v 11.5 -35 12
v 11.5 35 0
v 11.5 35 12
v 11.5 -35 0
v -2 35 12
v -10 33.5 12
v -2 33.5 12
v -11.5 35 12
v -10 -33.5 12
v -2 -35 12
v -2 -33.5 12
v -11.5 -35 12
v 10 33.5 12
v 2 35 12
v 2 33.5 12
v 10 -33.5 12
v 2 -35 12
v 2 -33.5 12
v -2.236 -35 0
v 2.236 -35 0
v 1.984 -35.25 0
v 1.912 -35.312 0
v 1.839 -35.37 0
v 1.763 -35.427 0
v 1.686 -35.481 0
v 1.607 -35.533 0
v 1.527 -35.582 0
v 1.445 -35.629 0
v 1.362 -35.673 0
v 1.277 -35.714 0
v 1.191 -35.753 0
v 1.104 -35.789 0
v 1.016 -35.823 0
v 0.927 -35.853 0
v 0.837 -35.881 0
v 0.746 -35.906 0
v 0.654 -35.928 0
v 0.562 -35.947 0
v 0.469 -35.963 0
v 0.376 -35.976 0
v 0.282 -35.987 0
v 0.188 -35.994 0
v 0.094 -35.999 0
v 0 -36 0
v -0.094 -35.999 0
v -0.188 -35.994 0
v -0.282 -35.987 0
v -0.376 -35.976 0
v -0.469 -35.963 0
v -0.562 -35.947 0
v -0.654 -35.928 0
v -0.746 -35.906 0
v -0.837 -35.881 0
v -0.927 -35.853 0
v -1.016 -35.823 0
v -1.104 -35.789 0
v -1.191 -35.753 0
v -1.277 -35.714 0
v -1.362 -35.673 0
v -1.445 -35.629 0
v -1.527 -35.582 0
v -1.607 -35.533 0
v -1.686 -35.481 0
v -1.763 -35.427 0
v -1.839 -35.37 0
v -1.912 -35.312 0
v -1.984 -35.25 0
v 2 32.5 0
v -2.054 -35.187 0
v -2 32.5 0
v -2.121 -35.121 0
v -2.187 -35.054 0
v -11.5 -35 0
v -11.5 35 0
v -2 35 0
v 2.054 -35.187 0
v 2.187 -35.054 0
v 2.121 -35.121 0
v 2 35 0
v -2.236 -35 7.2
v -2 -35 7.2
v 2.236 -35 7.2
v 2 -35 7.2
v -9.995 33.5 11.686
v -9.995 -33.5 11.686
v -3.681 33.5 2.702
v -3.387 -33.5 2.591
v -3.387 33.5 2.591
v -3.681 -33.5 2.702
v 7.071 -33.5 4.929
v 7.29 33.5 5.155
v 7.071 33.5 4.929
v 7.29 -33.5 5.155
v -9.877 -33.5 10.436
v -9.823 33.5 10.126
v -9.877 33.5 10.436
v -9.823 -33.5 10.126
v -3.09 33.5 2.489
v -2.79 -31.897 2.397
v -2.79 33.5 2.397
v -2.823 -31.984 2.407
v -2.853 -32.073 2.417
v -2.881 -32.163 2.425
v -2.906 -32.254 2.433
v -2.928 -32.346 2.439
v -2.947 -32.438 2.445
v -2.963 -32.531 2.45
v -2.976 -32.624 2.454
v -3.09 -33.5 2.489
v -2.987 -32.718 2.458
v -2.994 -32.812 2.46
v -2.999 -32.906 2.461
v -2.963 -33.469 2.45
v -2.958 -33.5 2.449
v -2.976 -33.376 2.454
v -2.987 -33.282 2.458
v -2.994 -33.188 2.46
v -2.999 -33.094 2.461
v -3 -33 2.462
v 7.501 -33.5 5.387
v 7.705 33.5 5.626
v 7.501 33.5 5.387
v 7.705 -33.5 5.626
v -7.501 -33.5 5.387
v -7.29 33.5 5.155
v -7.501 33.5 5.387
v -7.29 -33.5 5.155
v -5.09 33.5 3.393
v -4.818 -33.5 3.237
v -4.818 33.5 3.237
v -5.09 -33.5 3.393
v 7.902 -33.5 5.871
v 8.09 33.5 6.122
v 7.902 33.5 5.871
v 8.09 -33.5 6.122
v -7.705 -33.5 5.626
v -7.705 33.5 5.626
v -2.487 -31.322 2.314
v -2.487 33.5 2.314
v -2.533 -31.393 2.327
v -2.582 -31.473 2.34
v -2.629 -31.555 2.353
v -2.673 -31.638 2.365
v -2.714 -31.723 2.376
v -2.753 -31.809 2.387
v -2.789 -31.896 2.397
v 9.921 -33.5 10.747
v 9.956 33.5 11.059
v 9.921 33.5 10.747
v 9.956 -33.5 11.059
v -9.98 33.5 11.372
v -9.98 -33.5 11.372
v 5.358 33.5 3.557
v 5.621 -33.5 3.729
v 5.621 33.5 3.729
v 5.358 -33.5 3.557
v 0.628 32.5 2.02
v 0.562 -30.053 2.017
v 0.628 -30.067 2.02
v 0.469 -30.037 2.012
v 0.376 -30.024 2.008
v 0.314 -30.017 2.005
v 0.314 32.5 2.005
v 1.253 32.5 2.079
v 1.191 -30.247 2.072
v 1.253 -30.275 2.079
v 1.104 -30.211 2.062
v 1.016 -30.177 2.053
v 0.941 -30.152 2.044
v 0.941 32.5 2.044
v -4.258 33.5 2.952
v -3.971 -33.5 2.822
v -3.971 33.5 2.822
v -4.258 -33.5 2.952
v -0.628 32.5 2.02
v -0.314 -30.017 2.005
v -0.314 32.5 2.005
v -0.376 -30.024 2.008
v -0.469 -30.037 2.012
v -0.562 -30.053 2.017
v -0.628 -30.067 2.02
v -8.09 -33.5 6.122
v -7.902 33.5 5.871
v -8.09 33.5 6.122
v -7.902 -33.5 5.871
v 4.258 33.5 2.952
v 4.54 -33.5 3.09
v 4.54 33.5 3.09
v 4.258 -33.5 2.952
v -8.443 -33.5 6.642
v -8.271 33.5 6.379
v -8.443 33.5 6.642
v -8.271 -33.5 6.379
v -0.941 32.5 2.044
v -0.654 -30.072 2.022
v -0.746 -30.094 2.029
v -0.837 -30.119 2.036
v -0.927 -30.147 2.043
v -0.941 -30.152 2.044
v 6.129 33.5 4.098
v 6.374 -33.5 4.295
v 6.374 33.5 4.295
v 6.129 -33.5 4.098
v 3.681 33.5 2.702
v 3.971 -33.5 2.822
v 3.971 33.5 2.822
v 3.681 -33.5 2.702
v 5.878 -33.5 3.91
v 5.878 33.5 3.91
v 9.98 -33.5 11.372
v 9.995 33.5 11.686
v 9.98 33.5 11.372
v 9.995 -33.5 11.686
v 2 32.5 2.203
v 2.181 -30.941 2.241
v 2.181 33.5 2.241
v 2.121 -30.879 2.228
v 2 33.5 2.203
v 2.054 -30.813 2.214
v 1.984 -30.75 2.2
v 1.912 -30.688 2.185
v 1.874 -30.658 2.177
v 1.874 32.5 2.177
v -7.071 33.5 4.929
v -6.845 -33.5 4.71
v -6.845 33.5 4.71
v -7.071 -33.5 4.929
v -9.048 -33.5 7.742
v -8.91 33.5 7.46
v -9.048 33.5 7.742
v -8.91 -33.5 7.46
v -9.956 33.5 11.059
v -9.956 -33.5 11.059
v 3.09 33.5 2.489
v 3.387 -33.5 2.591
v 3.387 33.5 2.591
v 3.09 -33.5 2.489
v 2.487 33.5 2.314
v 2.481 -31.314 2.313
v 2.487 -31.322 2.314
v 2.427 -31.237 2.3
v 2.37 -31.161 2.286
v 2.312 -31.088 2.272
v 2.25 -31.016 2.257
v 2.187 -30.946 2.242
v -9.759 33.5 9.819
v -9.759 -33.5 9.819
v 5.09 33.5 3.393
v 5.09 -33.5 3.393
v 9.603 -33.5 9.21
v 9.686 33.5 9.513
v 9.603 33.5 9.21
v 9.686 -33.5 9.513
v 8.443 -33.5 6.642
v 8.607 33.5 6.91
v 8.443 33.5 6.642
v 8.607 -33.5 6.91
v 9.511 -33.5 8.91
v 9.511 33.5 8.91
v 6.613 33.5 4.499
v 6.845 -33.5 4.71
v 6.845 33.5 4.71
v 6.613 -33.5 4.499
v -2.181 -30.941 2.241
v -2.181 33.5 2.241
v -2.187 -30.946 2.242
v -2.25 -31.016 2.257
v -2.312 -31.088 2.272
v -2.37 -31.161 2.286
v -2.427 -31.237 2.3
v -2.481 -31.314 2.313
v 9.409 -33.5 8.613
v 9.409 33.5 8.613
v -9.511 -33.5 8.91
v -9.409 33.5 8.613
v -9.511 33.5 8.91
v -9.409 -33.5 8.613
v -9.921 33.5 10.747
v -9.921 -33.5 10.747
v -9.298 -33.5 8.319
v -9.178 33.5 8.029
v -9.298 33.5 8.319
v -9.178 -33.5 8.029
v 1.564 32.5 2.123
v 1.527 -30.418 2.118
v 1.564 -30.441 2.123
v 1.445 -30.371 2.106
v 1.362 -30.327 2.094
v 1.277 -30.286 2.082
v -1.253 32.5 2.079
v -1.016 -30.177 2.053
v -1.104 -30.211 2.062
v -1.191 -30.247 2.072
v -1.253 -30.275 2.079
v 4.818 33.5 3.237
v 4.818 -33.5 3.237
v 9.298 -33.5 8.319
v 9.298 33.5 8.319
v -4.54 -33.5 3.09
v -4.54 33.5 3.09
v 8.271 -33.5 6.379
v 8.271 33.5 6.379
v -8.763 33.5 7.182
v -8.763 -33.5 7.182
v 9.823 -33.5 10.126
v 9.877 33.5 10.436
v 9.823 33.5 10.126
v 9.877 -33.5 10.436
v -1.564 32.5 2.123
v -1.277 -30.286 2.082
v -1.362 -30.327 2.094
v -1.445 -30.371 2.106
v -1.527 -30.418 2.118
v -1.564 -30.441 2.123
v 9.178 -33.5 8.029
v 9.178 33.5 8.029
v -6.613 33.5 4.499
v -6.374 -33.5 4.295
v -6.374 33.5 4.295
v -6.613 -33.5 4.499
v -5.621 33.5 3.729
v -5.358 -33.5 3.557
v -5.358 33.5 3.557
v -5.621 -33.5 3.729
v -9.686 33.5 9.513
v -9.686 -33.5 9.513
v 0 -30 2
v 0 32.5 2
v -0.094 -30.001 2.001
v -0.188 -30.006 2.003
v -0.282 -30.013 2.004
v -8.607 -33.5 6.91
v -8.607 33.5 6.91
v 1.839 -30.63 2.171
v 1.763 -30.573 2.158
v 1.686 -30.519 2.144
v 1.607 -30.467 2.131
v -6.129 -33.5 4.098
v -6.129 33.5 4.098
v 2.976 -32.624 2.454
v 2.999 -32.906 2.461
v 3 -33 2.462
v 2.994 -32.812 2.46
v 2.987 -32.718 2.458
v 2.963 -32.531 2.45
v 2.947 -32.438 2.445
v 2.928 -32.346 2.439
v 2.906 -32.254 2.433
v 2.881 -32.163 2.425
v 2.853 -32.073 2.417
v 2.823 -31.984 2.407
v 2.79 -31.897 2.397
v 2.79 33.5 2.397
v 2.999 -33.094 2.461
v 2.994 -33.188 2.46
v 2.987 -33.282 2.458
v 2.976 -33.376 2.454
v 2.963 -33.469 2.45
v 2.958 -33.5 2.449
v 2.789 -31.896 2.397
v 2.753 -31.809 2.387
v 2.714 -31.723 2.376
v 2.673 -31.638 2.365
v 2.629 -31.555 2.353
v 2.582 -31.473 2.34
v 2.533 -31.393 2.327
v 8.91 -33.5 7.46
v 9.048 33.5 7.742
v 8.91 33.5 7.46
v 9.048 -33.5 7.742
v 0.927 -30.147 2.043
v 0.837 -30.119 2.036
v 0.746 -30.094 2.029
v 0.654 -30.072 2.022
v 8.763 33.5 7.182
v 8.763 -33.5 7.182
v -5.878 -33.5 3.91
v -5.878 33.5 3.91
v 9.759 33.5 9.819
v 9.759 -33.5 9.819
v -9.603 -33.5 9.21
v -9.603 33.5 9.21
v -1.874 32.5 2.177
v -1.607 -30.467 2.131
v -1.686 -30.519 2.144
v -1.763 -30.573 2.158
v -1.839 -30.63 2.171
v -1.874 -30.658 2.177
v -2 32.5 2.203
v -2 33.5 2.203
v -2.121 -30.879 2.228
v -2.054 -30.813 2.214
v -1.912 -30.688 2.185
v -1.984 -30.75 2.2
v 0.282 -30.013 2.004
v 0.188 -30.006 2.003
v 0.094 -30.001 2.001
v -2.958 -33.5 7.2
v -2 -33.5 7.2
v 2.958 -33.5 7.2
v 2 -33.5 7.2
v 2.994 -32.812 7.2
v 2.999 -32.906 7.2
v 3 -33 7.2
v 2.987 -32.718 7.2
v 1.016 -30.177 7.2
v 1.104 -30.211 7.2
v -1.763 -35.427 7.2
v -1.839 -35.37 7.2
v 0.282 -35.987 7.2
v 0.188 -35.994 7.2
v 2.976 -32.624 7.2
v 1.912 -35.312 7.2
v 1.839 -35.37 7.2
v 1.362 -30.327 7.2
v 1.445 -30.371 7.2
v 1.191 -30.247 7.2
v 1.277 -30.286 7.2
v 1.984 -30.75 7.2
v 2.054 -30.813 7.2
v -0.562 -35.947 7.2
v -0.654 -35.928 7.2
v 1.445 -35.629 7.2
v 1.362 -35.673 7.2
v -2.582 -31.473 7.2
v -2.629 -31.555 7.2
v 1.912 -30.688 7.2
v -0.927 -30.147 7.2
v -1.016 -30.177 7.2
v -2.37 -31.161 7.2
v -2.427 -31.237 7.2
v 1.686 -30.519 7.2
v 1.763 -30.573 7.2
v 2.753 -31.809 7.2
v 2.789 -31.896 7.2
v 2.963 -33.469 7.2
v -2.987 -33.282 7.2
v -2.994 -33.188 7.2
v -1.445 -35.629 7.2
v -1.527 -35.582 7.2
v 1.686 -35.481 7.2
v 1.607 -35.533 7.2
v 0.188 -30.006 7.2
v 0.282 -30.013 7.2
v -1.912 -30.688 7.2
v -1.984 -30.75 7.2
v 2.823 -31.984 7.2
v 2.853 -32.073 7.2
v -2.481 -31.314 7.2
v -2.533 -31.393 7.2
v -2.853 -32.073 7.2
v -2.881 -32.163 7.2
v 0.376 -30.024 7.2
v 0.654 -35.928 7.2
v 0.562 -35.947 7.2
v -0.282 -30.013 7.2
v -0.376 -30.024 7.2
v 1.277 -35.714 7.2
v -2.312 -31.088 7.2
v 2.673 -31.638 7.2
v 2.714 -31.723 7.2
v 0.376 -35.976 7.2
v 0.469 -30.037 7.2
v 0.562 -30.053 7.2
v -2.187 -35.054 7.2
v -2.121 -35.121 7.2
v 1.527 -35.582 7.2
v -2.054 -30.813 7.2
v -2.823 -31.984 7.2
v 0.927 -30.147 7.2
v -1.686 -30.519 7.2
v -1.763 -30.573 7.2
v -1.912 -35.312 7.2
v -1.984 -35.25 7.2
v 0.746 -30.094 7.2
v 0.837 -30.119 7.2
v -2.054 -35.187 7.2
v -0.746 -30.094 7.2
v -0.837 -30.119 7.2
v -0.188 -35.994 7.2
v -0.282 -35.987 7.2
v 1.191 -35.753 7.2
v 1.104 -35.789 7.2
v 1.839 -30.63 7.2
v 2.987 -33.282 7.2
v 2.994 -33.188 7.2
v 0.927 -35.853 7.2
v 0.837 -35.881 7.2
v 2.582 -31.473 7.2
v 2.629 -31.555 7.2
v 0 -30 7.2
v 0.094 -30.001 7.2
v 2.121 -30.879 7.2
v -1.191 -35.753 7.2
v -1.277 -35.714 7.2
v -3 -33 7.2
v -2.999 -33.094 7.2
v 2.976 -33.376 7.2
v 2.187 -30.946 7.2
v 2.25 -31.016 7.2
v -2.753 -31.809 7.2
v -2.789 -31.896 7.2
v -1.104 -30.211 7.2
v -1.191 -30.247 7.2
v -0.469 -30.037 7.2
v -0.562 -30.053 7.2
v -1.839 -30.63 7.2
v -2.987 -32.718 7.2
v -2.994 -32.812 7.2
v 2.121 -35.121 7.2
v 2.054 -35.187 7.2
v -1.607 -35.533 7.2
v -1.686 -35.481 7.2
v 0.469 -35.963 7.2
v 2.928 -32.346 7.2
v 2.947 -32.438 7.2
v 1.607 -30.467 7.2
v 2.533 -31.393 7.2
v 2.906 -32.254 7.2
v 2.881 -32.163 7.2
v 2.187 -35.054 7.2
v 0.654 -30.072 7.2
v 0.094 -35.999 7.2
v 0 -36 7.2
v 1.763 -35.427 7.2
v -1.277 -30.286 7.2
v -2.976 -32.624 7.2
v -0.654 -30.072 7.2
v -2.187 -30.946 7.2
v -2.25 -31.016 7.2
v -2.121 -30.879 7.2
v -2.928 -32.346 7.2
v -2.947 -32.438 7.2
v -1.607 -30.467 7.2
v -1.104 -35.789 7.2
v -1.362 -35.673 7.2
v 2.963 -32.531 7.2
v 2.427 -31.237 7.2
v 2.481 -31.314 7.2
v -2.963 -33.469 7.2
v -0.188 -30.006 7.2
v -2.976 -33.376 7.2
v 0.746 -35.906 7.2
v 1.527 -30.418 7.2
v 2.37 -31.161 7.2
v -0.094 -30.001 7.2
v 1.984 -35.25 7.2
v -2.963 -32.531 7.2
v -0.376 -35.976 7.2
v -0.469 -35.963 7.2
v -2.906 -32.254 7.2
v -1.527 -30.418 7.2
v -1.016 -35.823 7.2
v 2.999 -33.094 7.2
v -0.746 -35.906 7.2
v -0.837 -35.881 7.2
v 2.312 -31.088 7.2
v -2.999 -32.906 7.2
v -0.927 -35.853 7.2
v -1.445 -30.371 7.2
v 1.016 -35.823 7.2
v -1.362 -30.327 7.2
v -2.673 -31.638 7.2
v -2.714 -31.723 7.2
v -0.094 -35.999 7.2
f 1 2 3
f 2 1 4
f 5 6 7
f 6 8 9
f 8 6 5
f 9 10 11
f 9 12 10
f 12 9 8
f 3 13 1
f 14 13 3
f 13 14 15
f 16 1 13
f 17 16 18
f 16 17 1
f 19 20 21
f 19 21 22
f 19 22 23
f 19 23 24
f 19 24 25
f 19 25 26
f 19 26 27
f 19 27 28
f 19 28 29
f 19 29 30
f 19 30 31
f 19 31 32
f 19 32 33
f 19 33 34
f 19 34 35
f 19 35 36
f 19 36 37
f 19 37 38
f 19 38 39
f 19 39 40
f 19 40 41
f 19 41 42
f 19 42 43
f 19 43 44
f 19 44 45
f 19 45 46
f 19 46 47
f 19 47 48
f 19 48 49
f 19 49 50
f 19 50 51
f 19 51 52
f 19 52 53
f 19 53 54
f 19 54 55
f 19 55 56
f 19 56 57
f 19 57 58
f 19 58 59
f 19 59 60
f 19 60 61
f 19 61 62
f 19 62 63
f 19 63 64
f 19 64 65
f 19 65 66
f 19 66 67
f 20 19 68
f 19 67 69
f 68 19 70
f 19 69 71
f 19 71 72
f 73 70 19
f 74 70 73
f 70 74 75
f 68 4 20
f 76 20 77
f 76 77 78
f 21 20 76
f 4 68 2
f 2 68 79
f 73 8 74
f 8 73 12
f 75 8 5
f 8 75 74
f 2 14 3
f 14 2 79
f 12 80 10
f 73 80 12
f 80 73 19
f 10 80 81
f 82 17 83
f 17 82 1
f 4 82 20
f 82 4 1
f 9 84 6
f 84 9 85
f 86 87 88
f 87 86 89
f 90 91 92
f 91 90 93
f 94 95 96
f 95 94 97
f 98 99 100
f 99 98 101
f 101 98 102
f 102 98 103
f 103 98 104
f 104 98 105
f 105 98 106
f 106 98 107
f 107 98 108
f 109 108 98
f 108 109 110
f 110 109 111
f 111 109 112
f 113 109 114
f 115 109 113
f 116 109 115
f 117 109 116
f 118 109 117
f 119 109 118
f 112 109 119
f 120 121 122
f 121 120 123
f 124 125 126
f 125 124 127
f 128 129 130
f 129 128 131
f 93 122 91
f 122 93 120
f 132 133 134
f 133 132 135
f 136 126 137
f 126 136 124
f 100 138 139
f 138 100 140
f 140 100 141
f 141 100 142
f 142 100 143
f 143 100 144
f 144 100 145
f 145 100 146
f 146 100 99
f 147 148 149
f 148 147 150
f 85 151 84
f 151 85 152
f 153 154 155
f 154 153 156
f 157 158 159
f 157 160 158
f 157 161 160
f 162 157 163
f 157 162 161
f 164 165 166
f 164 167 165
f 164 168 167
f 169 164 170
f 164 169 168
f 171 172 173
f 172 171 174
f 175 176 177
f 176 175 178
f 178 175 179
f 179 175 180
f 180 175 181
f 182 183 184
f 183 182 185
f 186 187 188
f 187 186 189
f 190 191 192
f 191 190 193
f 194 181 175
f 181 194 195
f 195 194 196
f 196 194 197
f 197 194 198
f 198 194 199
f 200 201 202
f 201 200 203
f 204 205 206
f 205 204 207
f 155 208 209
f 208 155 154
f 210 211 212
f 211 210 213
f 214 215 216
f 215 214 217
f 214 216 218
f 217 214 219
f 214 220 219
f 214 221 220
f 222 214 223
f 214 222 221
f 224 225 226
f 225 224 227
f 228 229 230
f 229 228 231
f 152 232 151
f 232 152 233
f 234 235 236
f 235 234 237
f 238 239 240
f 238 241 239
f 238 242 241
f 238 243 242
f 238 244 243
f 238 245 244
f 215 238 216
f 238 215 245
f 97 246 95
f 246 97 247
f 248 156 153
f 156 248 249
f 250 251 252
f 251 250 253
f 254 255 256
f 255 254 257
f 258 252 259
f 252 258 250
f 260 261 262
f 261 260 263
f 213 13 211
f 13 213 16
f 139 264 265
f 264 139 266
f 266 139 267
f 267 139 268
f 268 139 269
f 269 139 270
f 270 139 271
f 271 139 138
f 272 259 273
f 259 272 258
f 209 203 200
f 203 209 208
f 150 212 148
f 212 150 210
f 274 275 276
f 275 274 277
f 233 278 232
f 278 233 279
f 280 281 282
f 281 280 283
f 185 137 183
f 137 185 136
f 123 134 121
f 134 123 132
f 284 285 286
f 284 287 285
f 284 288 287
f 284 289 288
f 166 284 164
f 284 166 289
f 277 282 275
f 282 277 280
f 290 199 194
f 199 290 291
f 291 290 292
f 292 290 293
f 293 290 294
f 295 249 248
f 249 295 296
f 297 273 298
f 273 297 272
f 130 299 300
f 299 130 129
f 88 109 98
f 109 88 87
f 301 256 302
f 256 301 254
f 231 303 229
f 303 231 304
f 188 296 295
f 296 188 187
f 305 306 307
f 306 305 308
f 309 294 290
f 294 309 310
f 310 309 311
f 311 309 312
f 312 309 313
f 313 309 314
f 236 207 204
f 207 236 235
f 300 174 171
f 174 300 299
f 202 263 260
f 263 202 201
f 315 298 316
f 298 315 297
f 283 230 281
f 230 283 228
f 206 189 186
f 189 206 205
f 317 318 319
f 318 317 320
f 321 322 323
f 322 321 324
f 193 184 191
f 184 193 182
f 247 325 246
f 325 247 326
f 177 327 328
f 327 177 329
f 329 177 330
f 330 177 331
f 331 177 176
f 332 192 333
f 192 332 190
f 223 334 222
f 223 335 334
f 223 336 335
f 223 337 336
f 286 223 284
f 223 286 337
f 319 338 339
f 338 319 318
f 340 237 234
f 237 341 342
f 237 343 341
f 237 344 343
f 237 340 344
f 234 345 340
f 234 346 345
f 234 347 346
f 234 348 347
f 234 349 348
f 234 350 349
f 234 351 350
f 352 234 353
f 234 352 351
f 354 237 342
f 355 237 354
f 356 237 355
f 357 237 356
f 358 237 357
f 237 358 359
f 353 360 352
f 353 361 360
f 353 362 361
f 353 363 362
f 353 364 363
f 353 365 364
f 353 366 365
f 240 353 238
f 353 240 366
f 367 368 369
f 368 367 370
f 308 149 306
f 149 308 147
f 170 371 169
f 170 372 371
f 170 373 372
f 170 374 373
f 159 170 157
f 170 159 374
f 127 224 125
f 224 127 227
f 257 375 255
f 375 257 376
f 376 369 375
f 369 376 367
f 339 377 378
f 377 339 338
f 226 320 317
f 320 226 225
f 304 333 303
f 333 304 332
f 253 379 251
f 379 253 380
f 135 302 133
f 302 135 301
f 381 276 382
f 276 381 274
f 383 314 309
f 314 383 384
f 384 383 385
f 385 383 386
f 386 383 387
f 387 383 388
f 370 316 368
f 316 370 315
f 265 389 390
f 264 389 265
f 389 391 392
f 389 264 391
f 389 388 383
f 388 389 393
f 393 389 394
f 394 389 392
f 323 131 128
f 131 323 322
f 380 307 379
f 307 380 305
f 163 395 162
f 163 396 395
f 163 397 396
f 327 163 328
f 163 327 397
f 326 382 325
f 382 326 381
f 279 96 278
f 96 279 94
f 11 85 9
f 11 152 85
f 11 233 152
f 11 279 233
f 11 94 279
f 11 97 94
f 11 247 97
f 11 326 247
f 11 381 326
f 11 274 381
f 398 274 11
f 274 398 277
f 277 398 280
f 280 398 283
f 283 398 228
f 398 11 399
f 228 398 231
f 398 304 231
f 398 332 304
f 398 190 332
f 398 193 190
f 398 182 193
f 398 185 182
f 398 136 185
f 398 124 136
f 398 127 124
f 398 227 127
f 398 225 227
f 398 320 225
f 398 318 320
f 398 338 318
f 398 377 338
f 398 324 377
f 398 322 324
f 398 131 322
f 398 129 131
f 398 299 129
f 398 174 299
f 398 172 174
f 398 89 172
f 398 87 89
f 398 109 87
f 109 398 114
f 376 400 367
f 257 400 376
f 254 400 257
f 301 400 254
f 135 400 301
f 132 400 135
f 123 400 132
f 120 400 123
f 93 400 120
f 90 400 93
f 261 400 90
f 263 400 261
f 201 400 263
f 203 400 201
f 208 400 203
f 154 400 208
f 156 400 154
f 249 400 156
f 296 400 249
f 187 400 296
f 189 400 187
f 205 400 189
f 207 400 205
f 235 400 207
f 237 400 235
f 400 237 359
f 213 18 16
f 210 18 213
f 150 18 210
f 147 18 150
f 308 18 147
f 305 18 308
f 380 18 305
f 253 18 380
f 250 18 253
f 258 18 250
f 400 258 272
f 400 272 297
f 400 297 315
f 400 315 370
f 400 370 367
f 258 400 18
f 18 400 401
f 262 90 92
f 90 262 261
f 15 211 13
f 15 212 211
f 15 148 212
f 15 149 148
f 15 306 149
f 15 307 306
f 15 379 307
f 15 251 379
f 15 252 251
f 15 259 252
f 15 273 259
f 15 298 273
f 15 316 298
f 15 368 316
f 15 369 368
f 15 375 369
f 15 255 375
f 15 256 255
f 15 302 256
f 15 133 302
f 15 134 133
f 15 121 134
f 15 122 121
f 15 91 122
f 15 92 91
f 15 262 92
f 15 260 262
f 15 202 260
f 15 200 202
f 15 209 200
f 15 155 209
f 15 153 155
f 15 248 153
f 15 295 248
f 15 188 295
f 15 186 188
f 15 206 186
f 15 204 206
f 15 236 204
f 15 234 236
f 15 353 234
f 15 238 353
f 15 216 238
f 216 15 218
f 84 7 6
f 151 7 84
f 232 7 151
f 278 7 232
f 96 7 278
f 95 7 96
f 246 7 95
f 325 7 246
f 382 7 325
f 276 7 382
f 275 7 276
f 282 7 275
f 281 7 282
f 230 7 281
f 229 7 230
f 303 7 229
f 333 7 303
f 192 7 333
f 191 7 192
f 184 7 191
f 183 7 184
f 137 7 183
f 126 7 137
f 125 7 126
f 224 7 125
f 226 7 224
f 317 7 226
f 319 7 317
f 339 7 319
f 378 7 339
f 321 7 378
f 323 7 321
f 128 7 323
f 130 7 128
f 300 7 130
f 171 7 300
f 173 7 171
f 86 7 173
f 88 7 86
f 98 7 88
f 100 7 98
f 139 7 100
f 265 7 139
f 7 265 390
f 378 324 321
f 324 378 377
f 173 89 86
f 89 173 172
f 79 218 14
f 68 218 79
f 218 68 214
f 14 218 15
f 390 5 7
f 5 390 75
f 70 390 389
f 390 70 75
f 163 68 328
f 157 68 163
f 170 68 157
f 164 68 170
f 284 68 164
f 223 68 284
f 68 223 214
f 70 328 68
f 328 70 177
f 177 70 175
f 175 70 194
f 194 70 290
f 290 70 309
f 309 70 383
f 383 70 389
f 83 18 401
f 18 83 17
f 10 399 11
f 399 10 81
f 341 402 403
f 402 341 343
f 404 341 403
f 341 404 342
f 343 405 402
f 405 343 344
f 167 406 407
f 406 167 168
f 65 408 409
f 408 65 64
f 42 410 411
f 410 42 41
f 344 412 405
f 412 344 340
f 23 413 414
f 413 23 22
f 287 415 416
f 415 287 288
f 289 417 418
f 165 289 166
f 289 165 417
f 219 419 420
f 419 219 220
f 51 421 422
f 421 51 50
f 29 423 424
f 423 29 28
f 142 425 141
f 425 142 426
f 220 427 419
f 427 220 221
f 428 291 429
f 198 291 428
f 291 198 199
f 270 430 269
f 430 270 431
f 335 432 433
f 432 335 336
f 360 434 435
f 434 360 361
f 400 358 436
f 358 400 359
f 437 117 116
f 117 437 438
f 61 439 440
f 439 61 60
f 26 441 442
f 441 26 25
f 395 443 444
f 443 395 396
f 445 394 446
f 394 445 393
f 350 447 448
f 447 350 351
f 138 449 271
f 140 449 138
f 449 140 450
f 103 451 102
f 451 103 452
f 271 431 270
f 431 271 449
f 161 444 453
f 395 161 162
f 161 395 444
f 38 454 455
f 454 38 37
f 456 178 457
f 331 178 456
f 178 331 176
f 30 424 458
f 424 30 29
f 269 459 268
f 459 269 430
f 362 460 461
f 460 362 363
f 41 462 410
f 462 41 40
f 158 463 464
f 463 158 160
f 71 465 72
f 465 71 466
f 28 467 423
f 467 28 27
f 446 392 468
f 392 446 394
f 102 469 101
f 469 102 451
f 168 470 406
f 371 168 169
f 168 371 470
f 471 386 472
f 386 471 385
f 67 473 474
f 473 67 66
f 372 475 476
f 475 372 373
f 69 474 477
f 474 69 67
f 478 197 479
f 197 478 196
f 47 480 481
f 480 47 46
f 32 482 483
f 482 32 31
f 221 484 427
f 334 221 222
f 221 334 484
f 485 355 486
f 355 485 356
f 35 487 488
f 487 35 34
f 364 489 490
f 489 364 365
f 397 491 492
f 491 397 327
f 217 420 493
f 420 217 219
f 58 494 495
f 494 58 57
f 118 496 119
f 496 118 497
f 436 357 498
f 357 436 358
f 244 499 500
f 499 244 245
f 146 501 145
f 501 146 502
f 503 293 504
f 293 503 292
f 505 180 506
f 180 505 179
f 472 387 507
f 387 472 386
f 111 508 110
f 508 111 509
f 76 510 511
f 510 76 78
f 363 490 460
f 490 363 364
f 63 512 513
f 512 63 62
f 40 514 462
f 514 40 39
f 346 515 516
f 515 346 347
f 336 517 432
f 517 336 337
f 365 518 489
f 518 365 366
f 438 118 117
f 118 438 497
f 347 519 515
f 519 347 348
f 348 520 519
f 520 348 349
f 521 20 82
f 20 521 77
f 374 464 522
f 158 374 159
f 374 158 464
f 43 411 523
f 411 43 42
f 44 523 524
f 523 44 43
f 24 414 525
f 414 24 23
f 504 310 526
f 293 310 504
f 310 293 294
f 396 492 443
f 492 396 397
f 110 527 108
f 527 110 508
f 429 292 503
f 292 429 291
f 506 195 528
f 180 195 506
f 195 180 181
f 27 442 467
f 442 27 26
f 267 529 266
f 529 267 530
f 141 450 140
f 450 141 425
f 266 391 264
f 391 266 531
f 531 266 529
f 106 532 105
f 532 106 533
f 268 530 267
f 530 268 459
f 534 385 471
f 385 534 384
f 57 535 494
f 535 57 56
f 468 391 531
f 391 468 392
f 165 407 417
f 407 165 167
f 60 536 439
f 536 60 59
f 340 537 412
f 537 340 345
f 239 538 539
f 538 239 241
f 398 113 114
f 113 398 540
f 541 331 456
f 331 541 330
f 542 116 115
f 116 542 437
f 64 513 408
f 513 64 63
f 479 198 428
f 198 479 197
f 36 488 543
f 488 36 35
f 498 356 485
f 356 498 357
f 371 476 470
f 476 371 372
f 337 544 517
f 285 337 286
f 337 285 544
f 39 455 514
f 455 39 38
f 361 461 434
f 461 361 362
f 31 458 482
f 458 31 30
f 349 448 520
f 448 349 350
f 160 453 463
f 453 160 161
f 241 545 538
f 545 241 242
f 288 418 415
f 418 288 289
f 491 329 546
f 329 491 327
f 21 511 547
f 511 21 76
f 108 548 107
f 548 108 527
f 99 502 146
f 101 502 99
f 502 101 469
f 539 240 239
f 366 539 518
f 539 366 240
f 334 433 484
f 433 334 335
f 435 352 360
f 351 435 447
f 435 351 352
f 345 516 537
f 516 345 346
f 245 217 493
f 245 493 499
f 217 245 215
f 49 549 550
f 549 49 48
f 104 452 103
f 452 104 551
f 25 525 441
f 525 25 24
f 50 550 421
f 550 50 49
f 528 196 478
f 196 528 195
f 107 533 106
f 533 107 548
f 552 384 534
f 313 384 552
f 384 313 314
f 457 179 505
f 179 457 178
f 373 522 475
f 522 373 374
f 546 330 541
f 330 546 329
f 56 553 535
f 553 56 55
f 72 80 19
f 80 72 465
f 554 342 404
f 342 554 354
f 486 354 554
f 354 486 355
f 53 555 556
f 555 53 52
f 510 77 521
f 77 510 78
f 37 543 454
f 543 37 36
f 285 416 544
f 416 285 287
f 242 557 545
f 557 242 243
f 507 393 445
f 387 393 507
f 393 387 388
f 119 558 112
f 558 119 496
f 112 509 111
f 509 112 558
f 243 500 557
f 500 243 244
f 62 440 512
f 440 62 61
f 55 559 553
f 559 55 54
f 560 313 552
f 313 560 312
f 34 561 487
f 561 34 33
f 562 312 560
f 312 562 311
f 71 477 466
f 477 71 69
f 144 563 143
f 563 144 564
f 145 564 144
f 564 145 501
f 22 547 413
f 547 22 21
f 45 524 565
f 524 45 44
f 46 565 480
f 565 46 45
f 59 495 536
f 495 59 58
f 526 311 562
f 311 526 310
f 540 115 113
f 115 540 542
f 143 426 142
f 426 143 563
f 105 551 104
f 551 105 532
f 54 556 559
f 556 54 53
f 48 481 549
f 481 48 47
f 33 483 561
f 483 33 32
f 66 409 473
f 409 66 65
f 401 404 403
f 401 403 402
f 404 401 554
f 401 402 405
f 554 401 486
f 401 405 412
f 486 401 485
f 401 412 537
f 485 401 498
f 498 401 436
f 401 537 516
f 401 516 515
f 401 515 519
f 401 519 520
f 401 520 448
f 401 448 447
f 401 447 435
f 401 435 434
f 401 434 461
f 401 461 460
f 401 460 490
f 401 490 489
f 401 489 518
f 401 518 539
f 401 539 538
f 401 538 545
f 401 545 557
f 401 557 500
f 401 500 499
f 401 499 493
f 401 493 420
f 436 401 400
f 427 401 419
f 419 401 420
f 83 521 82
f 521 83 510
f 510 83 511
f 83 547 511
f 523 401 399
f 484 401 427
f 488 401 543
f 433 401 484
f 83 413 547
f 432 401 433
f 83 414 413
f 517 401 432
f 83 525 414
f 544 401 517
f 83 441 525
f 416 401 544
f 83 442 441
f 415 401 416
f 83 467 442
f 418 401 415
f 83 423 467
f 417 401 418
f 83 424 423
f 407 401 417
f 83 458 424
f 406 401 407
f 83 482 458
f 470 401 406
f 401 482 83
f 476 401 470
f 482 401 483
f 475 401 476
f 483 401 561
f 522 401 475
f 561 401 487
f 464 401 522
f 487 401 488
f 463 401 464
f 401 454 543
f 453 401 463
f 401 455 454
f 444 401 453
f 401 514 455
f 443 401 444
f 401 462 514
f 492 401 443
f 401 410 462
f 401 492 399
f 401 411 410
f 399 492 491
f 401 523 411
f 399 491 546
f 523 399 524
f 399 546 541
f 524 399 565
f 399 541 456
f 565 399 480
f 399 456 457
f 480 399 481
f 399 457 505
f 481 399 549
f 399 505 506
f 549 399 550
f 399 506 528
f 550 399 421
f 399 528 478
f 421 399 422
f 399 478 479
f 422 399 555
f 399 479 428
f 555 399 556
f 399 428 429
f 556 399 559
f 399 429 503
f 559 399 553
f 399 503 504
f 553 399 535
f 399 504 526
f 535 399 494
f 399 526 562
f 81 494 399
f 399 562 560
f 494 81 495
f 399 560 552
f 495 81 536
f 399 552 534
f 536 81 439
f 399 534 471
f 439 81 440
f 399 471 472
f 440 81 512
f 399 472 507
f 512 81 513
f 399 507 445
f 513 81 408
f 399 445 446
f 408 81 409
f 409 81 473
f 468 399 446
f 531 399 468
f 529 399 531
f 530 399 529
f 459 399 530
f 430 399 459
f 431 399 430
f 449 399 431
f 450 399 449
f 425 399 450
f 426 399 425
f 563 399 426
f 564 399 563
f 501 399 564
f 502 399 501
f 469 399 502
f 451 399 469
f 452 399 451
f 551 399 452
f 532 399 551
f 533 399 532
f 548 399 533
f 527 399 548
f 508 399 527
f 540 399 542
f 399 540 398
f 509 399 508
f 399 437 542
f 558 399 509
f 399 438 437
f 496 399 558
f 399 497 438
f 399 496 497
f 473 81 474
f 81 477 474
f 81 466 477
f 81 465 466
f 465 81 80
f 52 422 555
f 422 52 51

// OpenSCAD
// file: orb_config.scad
// ============================================================
// Orb V4 — 全局参数配置
// AI Companion Orb 量产级结构设计
//
// 所有模块 include 此文件获取统一尺寸
// 修改这里的参数即可全局调整整机比例
// ============================================================

// --- 工业设计比例 ---
// 消费电子黄金比例: 高度 = 直径 × 0.82
orb_diameter    = 92;                       // 外径 92mm
orb_radius      = orb_diameter / 2;         // 46mm
orb_height      = 75;                       // 总高度 75mm (0.82 比例)
wall            = 2.2;                      // 壁厚 (注塑级)

// --- 三件式分模 ---
top_height      = 38;                       // 上壳高度 (球顶到分模线)
mid_height      = 20;                       // 中框高度
bottom_height   = 17;                       // 底座高度
// 合计: 38 + 20 + 17 = 75mm

// --- LED 光学 ---
led_ring_diameter   = 60;                   // LED 环直径
led_ring_radius     = led_ring_diameter / 2;
led_count           = 24;                   // WS2812B 数量
led_spacing         = 3.14159 * led_ring_diameter / led_count; // ~7.85mm

// --- 光导环 ---
lightguide_outer    = 34;                   // 光导环外径
lightguide_inner    = 28;                   // 光导环内径 (壁厚 6mm)
lightguide_height   = 12;                   // 光导环高度
lightguide_wall     = lightguide_outer - lightguide_inner; // 6mm

// --- PCB ---
pcb_diameter        = 65;                   // 主控 PCB 直径
pcb_radius          = pcb_diameter / 2;
pcb_thick           = 1.6;                  // PCB 板厚
pcb_mount_r         = 28;                   // 安装柱到中心距离
pcb_mount_angles    = [0, 120, 240];        // 3 点均布

// --- 扬声器 ---
speaker_diameter    = 40;                   // 扬声器直径
speaker_radius      = speaker_diameter / 2;
speaker_chamber_h   = 18;                   // 共振腔高度
speaker_chamber_r   = 26;                   // 共振腔外径
speaker_chamber_ir  = 22;                   // 共振腔内径
speaker_wall        = speaker_chamber_r - speaker_chamber_ir; // 4mm

// --- 倒相管 (Bass Reflex) ---
bass_port_diameter  = 8;                    // 倒相管直径
bass_port_radius    = bass_port_diameter / 2;
bass_port_length    = 12;                   // 倒相管长度
bass_port_offset    = 18;                   // 倒相管到中心距离

// --- 麦克风阵列 ---
mic_count           = 3;                    // INMP441 × 3
mic_radius          = 25;                   // 麦克风到中心距离
mic_hole_r          = 1;                    // 拾音孔半径 Ø2mm
mic_angles          = [0, 120, 240];        // 120° 均布

// --- 电池 ---
battery_diameter    = 18;                   // 18650 直径
battery_length      = 65;                   // 18650 长度
battery_padding     = 1;                    // 电池槽间隙

// --- 底座 ---
base_diameter       = 62;                   // 底面直径
base_radius         = base_diameter / 2;
silicone_pad_thick  = 1;                    // 硅胶垫厚度

// --- 声孔 ---
sound_hole_r        = 1.5;                  // Ø3mm 声孔
sound_hole_count    = 8;

// --- 装配 ---
snap_fit_tol        = 0.15;                 // 卡扣配合间隙
screw_r             = 1.1;                  // M2 螺孔半径
screw_head_r        = 2;                    // M2 螺帽半径

// --- 渲染精度 ---
$fn = 200;                                  // 全局精度 (渲染用)
$fn_preview = 60;                           // 预览精度 (F5 用)
// main file
// ============================================================
// Orb V4 — 18650 电池槽
//
// 设计要点:
//   - 适配标准 18650 锂电池 (Ø18 × 65mm)
//   - 圆弧底面贴合电池形状
//   - 两端预留弹簧触片空间
//   - 侧面导线槽
//   - 底部与底座腔体适配
// ============================================================

include <orb_config.scad>;

module battery_slot() {
    slot_w = battery_diameter + battery_padding * 2 + 3;   // ~23mm
    slot_l = battery_length + battery_padding * 2 + 3;     // ~71mm
    slot_h = battery_diameter / 2 + battery_padding + 2;   // ~13mm

    difference() {
        // 外壳
        translate([-slot_w/2, -slot_l/2, 0])
            cube([slot_w, slot_l, slot_h]);

        // 电池腔（上半圆柱）
        translate([0, 0, slot_h])
            rotate([90, 0, 0])
                translate([0, 0, -battery_length/2 - battery_padding])
                    cylinder(h = battery_length + battery_padding * 2,
                             r = battery_diameter/2 + battery_padding);

        // 正极导线槽
        translate([0, slot_l/2 - 1, slot_h/2])
            cube([4, 3, slot_h + 1], center = true);

        // 负极导线槽
        translate([0, -(slot_l/2 - 1), slot_h/2])
            cube([4, 3, slot_h + 1], center = true);
    }

    // 弹簧触片凸台（负极端）
    translate([0, -slot_l/2 + 2, 0])
        cylinder(h = slot_h * 0.6, r = 3);
}

battery_slot();
